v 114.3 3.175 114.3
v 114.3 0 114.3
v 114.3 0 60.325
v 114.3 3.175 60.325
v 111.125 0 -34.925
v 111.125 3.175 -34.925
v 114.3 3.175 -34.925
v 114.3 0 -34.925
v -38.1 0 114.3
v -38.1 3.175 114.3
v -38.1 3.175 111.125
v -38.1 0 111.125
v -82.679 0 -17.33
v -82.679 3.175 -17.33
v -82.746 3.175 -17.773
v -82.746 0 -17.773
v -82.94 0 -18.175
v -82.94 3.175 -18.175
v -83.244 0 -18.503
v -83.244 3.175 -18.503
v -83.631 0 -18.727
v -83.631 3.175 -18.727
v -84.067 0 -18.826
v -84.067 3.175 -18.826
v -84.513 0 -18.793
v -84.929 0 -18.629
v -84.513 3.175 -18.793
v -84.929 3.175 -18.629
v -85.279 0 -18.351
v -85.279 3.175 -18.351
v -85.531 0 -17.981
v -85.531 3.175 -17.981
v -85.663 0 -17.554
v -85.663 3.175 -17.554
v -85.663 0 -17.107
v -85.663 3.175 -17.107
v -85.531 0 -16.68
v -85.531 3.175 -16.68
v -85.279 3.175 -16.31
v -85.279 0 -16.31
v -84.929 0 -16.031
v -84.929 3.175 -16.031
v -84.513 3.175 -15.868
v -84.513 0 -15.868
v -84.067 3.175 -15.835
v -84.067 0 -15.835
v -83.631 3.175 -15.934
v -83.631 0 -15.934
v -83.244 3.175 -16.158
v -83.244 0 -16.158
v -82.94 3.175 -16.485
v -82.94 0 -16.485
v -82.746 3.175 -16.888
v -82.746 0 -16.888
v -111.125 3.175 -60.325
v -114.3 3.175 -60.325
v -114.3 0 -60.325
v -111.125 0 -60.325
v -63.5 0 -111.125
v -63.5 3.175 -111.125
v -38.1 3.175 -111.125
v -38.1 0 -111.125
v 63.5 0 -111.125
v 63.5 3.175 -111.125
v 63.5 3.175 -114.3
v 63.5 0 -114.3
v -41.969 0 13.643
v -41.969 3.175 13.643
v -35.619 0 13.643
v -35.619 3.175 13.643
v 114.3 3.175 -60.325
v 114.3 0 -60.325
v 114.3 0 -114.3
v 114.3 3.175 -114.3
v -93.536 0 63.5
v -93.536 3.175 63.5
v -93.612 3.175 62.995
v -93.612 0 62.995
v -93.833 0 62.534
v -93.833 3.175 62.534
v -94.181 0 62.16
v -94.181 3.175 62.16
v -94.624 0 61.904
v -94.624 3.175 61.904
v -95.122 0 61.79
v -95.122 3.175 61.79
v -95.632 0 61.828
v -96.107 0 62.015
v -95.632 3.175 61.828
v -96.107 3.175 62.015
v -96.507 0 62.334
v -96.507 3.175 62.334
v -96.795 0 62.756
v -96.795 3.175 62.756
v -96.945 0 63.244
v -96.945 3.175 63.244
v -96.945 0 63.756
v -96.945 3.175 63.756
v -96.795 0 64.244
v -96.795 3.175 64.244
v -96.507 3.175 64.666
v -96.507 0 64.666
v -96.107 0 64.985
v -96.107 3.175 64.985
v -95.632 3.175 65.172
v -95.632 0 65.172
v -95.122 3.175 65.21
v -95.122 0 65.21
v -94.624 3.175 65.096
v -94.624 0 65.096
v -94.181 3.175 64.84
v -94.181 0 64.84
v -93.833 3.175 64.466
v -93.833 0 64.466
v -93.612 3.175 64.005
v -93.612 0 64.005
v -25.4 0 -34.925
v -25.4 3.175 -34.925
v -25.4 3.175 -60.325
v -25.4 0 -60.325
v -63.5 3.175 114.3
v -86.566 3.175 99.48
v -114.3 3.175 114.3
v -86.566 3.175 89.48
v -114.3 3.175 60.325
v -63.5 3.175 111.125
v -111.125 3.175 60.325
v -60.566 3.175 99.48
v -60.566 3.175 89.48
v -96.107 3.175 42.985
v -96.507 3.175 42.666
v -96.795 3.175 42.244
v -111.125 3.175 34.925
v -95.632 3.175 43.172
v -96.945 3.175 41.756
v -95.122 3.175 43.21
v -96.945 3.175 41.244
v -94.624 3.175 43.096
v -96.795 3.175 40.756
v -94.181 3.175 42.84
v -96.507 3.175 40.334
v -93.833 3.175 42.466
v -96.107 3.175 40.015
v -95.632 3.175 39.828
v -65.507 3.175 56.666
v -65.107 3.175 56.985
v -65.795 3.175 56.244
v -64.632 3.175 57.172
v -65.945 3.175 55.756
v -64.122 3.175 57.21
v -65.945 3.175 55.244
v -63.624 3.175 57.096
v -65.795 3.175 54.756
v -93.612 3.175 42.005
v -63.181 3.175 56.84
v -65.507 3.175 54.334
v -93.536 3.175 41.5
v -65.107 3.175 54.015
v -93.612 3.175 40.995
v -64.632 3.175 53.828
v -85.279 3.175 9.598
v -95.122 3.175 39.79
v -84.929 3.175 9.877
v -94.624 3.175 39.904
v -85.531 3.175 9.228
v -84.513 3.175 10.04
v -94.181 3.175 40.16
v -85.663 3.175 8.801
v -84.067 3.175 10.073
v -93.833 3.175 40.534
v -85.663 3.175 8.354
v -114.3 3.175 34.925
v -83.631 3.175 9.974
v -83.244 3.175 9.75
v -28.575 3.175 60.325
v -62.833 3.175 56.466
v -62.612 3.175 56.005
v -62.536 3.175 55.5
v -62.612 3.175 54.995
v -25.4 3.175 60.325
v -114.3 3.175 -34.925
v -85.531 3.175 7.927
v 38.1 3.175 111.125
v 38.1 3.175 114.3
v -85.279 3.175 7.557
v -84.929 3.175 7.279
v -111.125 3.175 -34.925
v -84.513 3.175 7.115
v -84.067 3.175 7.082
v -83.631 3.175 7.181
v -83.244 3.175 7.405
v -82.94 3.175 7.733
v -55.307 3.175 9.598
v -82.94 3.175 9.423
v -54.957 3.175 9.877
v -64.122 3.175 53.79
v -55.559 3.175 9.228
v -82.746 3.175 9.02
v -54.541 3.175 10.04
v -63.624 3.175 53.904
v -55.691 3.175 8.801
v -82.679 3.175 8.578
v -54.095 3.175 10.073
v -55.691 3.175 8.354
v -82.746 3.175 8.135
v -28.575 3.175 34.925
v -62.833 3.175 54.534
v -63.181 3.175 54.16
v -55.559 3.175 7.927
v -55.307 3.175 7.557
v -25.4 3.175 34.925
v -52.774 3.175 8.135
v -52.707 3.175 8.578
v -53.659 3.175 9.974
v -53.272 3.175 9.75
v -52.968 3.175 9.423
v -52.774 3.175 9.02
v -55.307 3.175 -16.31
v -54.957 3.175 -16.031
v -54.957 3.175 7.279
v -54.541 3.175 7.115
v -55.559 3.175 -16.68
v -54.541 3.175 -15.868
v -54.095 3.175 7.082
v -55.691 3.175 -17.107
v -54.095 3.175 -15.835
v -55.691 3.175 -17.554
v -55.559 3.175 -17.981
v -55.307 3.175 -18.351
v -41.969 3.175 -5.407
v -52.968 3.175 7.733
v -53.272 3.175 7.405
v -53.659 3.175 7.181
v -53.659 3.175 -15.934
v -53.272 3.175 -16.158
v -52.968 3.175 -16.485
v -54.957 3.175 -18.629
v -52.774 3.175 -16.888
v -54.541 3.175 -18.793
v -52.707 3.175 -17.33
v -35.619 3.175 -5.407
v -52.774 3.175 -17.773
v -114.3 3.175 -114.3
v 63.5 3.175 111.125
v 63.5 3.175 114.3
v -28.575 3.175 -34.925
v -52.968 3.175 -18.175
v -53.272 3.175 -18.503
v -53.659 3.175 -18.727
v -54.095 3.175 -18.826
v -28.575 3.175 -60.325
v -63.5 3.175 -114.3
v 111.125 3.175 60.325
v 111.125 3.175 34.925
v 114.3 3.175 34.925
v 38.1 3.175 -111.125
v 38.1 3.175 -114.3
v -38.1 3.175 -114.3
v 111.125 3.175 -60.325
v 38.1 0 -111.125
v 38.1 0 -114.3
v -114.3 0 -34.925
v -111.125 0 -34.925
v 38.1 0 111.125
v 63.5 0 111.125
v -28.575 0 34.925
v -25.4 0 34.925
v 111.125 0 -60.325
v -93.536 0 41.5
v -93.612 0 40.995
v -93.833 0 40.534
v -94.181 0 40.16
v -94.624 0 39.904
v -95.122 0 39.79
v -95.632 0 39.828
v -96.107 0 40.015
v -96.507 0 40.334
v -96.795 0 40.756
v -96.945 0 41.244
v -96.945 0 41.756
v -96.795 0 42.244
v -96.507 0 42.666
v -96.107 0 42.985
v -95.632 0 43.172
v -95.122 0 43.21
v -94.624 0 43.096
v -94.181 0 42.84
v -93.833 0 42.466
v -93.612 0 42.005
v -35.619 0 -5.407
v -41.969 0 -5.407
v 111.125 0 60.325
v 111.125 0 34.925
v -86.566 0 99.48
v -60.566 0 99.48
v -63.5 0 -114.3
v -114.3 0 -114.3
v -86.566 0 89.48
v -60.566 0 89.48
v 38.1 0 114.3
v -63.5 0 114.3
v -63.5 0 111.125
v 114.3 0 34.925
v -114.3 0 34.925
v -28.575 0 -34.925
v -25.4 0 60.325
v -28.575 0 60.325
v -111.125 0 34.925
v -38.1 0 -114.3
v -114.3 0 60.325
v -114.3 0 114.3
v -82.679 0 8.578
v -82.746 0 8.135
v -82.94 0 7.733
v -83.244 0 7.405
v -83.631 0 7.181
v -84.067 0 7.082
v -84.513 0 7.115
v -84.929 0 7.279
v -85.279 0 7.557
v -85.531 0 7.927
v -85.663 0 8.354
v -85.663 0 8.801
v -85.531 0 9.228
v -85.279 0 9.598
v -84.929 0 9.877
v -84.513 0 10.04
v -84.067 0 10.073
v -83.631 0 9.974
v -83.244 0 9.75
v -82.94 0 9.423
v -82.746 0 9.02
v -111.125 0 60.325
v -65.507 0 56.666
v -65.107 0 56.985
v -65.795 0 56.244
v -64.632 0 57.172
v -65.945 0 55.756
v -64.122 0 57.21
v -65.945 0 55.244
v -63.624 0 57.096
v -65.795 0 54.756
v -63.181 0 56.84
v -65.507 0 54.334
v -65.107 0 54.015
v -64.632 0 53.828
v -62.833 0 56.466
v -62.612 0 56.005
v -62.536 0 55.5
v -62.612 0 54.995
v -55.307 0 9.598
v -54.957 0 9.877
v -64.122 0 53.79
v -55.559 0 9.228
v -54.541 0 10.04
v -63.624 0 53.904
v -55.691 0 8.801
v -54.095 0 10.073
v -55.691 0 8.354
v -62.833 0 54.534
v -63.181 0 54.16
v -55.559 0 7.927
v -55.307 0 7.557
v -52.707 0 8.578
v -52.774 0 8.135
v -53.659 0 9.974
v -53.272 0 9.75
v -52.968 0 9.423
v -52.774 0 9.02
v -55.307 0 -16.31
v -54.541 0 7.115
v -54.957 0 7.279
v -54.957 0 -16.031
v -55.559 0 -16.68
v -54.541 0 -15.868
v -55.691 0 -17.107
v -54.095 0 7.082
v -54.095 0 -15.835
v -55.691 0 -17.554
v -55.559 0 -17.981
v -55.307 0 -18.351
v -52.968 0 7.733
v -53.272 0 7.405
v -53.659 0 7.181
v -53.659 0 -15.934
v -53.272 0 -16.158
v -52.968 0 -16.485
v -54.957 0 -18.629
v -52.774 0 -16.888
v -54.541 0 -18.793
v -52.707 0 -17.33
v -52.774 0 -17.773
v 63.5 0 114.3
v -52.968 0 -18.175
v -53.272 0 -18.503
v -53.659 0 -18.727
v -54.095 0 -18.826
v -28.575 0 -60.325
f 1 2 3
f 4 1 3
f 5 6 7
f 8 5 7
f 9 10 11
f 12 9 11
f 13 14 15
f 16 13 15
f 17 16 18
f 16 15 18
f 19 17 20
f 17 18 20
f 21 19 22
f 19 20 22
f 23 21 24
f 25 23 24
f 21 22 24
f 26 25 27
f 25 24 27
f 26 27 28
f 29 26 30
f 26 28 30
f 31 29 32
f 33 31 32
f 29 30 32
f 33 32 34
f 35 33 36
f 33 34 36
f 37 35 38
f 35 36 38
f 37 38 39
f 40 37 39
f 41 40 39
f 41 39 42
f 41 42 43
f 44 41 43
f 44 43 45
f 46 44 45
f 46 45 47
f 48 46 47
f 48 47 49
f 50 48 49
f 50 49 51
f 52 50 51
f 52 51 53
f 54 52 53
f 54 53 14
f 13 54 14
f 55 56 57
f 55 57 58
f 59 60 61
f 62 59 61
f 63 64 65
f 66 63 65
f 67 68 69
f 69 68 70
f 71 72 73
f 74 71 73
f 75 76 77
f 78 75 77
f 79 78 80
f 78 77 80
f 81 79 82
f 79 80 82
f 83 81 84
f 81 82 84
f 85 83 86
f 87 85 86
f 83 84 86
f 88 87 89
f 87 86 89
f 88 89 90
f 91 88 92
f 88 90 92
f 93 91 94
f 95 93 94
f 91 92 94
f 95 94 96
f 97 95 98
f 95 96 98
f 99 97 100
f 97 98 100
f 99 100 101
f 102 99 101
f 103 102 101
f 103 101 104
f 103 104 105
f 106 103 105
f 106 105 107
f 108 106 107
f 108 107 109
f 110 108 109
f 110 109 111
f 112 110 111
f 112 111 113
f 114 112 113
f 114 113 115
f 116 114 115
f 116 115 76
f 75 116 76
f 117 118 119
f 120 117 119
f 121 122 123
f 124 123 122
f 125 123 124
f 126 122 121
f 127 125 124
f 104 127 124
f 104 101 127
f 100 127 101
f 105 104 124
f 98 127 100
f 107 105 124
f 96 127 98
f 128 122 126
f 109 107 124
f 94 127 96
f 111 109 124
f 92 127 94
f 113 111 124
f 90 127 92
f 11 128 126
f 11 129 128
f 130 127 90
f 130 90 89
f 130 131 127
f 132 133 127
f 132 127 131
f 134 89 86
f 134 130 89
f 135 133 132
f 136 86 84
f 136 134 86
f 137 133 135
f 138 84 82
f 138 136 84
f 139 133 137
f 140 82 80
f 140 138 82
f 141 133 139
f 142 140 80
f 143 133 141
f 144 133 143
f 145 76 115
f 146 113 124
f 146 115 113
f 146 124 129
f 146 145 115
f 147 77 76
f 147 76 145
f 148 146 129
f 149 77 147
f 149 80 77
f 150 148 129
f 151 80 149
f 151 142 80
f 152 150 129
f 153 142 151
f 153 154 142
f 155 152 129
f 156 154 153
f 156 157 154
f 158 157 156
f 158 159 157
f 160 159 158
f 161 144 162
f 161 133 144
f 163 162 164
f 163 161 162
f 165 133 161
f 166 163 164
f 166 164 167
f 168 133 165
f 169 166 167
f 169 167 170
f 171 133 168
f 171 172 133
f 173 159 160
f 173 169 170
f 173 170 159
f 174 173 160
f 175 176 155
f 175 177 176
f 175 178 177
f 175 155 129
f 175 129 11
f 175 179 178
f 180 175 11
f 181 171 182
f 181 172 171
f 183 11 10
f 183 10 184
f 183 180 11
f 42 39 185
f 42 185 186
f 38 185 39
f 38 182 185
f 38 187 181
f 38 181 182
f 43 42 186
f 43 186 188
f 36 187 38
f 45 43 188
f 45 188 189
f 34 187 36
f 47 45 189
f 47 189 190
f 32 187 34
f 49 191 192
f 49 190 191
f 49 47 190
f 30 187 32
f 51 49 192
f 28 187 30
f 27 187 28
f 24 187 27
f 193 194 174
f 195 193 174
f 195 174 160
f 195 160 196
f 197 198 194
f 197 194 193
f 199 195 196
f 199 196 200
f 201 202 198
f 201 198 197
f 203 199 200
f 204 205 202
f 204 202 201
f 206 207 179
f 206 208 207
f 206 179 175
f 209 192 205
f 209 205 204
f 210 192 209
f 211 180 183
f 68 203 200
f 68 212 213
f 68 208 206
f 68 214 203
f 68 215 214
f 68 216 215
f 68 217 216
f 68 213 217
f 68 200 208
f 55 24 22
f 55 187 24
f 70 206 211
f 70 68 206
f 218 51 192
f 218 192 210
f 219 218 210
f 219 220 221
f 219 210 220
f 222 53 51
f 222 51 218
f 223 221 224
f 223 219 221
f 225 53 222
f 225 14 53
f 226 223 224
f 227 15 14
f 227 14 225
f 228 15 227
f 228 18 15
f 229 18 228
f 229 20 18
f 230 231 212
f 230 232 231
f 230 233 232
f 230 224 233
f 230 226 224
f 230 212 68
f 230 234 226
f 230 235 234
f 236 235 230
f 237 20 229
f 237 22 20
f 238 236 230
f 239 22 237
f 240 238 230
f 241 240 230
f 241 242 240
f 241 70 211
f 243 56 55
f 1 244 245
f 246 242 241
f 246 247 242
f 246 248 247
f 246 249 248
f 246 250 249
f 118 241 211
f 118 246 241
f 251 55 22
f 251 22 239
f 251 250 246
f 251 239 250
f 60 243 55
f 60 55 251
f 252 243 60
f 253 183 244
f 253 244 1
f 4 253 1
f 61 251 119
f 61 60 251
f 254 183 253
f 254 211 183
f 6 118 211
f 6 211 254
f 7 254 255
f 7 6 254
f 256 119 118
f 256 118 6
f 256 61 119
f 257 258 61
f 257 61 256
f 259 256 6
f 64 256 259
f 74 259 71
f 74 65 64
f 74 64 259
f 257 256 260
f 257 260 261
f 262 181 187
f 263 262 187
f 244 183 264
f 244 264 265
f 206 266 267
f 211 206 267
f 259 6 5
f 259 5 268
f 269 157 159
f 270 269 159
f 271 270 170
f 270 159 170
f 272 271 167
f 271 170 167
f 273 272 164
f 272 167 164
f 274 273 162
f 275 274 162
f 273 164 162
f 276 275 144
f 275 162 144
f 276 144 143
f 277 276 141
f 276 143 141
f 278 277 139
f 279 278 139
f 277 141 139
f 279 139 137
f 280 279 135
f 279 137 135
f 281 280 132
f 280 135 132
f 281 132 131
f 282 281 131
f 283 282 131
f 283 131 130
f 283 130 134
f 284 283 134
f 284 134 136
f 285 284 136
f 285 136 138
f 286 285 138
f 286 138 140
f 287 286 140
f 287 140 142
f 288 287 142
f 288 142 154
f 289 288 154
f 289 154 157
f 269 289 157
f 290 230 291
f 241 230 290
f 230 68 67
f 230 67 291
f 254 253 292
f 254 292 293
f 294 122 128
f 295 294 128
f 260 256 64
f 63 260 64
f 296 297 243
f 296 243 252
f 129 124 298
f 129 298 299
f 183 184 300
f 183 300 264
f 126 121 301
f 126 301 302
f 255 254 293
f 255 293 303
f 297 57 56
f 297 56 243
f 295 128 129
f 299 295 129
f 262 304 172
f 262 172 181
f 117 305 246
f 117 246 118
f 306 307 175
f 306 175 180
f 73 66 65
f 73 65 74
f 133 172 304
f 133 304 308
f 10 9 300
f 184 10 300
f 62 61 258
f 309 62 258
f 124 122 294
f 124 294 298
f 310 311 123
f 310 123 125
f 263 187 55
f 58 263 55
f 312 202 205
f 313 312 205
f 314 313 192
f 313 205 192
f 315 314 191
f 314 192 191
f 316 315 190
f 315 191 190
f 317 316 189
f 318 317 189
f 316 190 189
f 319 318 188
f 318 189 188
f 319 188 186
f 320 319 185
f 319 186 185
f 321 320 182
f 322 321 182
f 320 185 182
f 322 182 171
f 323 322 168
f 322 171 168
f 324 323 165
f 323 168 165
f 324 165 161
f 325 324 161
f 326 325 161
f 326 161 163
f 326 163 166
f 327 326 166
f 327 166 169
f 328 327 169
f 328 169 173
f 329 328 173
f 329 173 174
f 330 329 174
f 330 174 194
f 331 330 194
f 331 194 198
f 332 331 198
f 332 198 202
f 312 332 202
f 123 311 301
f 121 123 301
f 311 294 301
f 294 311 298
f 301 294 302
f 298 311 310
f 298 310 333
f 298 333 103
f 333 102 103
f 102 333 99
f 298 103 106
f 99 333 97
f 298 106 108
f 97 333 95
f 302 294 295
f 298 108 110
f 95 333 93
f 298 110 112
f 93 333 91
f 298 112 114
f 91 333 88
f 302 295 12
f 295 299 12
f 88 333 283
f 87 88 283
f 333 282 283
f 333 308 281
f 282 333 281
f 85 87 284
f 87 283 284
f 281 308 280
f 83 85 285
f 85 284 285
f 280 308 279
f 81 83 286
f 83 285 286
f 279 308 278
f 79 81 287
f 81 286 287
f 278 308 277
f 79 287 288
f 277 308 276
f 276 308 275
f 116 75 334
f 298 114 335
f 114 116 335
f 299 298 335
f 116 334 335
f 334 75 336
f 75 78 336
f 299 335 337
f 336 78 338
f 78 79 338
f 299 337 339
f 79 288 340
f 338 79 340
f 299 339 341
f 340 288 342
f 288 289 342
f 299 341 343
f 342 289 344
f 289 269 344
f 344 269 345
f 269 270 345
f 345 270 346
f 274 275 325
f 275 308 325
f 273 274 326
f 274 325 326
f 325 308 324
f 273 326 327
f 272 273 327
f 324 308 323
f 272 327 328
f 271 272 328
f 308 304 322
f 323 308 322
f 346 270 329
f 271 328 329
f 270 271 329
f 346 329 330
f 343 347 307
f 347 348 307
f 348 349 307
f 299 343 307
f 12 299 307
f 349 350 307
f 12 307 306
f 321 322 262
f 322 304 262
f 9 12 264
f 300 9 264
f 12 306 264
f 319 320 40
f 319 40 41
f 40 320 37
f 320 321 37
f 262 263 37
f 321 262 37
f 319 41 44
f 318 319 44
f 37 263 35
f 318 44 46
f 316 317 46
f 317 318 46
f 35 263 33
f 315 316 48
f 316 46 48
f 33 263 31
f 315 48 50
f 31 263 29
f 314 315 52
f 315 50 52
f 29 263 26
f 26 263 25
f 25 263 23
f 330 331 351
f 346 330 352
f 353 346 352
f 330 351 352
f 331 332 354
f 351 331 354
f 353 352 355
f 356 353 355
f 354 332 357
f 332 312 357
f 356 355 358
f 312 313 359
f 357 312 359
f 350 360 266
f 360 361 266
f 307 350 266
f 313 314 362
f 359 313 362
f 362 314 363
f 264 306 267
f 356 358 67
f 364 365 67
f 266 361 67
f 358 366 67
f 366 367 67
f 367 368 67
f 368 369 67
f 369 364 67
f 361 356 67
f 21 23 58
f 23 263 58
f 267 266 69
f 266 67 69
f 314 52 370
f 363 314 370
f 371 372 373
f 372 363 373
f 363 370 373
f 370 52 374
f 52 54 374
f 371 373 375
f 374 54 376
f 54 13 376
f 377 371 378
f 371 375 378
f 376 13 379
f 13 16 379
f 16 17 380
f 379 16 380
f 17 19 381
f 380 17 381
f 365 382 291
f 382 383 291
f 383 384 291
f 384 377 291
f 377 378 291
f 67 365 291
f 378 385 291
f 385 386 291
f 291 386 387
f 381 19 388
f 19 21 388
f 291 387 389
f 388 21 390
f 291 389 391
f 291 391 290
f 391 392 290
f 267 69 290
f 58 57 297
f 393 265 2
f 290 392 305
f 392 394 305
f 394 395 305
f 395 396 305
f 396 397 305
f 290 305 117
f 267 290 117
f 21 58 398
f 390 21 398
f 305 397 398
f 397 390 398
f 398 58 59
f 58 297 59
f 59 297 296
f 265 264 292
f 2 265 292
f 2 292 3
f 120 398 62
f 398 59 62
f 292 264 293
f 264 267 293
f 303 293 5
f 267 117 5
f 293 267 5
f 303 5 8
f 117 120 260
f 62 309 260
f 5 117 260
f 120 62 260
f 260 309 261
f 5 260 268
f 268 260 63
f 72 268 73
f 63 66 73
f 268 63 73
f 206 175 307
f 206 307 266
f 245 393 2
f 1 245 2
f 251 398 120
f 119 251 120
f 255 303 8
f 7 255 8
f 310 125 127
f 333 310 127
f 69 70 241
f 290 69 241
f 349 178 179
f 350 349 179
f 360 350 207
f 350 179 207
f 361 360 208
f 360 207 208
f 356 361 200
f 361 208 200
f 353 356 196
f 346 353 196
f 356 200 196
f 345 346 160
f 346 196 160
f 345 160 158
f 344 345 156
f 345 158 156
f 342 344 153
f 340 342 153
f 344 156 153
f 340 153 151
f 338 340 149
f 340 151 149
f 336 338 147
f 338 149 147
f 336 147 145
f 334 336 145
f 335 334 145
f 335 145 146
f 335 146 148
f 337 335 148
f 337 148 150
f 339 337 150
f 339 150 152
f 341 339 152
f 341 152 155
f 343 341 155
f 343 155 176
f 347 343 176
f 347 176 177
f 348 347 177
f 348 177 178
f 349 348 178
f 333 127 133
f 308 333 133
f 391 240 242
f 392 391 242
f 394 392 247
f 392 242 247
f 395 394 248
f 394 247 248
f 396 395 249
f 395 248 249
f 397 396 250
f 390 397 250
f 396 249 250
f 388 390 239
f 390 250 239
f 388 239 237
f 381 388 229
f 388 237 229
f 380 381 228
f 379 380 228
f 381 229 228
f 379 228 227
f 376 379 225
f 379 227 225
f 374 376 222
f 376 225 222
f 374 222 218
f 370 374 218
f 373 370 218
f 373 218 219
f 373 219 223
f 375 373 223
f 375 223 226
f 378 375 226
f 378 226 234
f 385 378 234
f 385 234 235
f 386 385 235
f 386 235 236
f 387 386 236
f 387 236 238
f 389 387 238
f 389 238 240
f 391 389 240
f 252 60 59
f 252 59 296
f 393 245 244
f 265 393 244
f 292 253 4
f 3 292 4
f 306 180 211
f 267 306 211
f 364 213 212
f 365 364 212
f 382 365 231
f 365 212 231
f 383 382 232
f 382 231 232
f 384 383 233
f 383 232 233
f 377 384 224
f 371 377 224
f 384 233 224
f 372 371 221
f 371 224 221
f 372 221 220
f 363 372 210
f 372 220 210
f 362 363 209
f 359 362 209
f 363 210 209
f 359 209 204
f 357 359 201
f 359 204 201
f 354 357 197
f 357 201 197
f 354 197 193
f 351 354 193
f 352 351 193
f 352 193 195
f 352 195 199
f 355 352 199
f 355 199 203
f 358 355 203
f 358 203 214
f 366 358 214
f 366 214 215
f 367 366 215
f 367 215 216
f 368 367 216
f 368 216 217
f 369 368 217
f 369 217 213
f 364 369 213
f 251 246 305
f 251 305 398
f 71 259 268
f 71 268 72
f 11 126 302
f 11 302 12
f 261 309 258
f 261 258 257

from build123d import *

# Parameters (mm, degrees)
SKETCH1_W           = 228.6
SKETCH1_H           = 228.6
BOSS_EXTRUDE1_DEPTH = 3.175
SKETCH2_R           = 1.7145
SKETCH2_R_2         = 1.5
SKETCH2_W           = 26
SKETCH2_H           = 10.000000066
SKETCH2_W_2         = 6.35
SKETCH2_H_2         = 19.05
CUT_EXTRUDE1_DEPTH  = 4.175
SKETCH3_W           = 3.175
SKETCH3_H           = 25.4
SKETCH3_W_2         = 25.4
SKETCH3_H_2         = 3.175
CUT_EXTRUDE2_DEPTH  = 4.175


with BuildPart() as part:
    # Sketch1 → Boss-Extrude1 (new body)
    with BuildSketch(Plane(origin=(0, 0, 0), x_dir=(1, 0, 0), z_dir=(0, 1, 0))):
        Rectangle(SKETCH1_W, SKETCH1_H)
    extrude(amount=BOSS_EXTRUDE1_DEPTH)

    # Sketch2 → Cut-Extrude1 (cut, through all)
    with BuildSketch(Plane(origin=(0, 3.175, 0), x_dir=(1, 0, 0), z_dir=(0, 1, 0))):
        with Locations((-95.250000001, -63.5)):
            Circle(SKETCH2_R)
        with Locations((-95.25, -41.5)):
            Circle(SKETCH2_R)
        with Locations((-64.250000001, -55.5)):
            Circle(SKETCH2_R)
        with Locations((-84.179457051, 17.330418354)):
            Circle(SKETCH2_R_2)
        with Locations((-54.207457051, 17.330418354)):
            Circle(SKETCH2_R_2)
        with Locations((-54.207457051, -8.577581646)):
            Circle(SKETCH2_R_2)
        with Locations((-84.179457051, -8.577581646)):
            Circle(SKETCH2_R_2)
        with Locations((-73.56649281, -94.479721333)):
            Rectangle(SKETCH2_W, SKETCH2_H)
        with Locations((-38.794244325, -4.118289102)):
            Rectangle(SKETCH2_W_2, SKETCH2_H_2)
    extrude(amount=-CUT_EXTRUDE1_DEPTH, mode=Mode.SUBTRACT)

    # Sketch3 → Cut-Extrude2 (cut, through all)
    with BuildSketch(Plane(origin=(0, 3.175, 0), x_dir=(1, 0, 0), z_dir=(0, 1, 0))):
        with Locations((-112.7125, 47.625)):
            Rectangle(SKETCH3_W, SKETCH3_H)
        with Locations((-112.7125, -47.625)):
            Rectangle(SKETCH3_W, SKETCH3_H)
        with Locations((112.7125, 47.625)):
            Rectangle(SKETCH3_W, SKETCH3_H)
        with Locations((112.7125, -47.625)):
            Rectangle(SKETCH3_W, SKETCH3_H)
        with Locations((50.8, -112.7125)):
            Rectangle(SKETCH3_W_2, SKETCH3_H_2)
        with Locations((-50.8, -112.7125)):
            Rectangle(SKETCH3_W_2, SKETCH3_H_2)
        with Locations((-50.8, 112.7125)):
            Rectangle(SKETCH3_W_2, SKETCH3_H_2)
        with Locations((50.8, 112.7125)):
            Rectangle(SKETCH3_W_2, SKETCH3_H_2)
        with Locations((-26.9875, -47.625)):
            Rectangle(SKETCH3_W, SKETCH3_H)
        with Locations((-26.9875, 47.625)):
            Rectangle(SKETCH3_W, SKETCH3_H)
    extrude(amount=-CUT_EXTRUDE2_DEPTH, mode=Mode.SUBTRACT)


solid = part.part
